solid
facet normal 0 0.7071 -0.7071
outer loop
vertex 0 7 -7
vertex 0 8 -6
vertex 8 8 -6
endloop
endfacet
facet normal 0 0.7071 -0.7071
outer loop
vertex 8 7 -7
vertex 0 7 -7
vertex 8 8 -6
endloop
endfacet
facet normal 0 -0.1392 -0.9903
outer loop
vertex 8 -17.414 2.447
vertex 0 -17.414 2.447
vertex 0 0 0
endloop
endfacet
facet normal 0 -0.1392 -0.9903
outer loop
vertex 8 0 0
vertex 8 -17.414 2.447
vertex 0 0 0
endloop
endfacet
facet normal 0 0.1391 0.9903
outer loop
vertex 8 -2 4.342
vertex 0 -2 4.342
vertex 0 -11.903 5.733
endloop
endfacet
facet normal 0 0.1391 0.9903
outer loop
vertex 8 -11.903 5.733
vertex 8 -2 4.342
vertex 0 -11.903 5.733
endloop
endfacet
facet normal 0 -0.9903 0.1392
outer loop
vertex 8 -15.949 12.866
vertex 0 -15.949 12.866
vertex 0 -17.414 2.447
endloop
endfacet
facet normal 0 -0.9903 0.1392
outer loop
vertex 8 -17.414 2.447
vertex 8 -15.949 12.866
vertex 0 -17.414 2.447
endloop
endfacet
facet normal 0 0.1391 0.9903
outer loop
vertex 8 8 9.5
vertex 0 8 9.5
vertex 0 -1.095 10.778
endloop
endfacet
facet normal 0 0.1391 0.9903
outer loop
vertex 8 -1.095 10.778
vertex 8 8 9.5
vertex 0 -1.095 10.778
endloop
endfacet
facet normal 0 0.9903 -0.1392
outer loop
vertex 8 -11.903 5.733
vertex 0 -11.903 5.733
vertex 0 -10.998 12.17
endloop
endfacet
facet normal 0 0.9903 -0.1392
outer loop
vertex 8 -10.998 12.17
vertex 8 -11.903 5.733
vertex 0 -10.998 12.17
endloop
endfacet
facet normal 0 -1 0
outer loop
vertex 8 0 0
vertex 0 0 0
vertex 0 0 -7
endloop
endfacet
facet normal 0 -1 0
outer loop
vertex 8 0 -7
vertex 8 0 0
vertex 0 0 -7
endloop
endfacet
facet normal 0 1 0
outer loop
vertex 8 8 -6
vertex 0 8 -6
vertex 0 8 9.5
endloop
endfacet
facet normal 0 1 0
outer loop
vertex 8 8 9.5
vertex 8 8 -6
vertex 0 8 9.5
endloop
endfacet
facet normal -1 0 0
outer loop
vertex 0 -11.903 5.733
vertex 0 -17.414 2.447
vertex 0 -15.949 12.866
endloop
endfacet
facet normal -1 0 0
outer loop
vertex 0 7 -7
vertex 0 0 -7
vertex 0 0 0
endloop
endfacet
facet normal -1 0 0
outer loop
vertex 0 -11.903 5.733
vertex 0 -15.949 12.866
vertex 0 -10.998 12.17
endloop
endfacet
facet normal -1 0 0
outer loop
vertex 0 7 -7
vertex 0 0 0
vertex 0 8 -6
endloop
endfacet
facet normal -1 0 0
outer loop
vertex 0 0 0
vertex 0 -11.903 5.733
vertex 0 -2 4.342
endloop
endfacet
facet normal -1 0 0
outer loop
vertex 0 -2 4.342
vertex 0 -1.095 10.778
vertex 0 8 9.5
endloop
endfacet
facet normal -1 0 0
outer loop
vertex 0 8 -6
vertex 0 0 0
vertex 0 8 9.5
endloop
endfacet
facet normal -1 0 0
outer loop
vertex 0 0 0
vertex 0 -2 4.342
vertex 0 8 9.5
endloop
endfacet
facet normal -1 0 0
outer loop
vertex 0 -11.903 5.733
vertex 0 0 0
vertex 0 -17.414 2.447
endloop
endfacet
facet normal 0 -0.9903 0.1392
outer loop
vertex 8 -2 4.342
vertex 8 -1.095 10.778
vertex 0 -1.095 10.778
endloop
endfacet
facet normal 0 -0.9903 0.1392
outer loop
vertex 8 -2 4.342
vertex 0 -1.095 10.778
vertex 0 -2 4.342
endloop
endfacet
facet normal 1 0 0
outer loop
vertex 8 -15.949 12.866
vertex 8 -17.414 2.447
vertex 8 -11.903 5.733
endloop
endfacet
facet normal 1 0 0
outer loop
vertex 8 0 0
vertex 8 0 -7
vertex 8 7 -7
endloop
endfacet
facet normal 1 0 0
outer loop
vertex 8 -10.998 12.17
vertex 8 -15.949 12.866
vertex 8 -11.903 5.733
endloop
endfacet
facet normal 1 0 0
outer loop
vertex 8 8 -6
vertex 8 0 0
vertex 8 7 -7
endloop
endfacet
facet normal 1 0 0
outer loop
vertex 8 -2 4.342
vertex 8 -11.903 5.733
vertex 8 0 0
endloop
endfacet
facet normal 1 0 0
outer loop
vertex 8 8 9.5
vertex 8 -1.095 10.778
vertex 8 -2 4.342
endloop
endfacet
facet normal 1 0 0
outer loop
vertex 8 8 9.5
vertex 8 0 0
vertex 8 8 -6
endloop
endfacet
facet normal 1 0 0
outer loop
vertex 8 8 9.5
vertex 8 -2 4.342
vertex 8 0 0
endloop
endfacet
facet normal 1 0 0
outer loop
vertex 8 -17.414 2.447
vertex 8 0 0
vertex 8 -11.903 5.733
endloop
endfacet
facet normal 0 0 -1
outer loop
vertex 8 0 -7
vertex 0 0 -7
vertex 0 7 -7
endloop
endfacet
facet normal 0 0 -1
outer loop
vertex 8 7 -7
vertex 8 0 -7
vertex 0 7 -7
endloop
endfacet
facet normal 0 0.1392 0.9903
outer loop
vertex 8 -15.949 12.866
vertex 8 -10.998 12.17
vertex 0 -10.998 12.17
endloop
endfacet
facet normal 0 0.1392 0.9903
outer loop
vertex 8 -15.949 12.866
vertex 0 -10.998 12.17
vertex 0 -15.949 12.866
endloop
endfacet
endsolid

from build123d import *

# Parameters (mm, degrees)
F1_DEPTH = 8
F2_SIZE  = 1


with BuildPart() as f1:
    # F0 (on Right) → F1 (new body)
    with BuildSketch(Plane.YZ):
        Polygon((-17.413627, 2.447326), (0, 0), (0, -7), (8, -7), (8, 9.5), (-1.095375, 10.778272), (-2, 4.341529), (-11.902681, 5.73326), (-10.998056, 12.170003), (-15.949396, 12.865868), align=None)
    extrude(amount=F1_DEPTH)

    # F2
    f2_edges = [f1.edges().sort_by_distance(p)[0] for p in [
        (4, 8, -7),
    ]]
    chamfer(f2_edges, length=F2_SIZE)


solid = f1.part
